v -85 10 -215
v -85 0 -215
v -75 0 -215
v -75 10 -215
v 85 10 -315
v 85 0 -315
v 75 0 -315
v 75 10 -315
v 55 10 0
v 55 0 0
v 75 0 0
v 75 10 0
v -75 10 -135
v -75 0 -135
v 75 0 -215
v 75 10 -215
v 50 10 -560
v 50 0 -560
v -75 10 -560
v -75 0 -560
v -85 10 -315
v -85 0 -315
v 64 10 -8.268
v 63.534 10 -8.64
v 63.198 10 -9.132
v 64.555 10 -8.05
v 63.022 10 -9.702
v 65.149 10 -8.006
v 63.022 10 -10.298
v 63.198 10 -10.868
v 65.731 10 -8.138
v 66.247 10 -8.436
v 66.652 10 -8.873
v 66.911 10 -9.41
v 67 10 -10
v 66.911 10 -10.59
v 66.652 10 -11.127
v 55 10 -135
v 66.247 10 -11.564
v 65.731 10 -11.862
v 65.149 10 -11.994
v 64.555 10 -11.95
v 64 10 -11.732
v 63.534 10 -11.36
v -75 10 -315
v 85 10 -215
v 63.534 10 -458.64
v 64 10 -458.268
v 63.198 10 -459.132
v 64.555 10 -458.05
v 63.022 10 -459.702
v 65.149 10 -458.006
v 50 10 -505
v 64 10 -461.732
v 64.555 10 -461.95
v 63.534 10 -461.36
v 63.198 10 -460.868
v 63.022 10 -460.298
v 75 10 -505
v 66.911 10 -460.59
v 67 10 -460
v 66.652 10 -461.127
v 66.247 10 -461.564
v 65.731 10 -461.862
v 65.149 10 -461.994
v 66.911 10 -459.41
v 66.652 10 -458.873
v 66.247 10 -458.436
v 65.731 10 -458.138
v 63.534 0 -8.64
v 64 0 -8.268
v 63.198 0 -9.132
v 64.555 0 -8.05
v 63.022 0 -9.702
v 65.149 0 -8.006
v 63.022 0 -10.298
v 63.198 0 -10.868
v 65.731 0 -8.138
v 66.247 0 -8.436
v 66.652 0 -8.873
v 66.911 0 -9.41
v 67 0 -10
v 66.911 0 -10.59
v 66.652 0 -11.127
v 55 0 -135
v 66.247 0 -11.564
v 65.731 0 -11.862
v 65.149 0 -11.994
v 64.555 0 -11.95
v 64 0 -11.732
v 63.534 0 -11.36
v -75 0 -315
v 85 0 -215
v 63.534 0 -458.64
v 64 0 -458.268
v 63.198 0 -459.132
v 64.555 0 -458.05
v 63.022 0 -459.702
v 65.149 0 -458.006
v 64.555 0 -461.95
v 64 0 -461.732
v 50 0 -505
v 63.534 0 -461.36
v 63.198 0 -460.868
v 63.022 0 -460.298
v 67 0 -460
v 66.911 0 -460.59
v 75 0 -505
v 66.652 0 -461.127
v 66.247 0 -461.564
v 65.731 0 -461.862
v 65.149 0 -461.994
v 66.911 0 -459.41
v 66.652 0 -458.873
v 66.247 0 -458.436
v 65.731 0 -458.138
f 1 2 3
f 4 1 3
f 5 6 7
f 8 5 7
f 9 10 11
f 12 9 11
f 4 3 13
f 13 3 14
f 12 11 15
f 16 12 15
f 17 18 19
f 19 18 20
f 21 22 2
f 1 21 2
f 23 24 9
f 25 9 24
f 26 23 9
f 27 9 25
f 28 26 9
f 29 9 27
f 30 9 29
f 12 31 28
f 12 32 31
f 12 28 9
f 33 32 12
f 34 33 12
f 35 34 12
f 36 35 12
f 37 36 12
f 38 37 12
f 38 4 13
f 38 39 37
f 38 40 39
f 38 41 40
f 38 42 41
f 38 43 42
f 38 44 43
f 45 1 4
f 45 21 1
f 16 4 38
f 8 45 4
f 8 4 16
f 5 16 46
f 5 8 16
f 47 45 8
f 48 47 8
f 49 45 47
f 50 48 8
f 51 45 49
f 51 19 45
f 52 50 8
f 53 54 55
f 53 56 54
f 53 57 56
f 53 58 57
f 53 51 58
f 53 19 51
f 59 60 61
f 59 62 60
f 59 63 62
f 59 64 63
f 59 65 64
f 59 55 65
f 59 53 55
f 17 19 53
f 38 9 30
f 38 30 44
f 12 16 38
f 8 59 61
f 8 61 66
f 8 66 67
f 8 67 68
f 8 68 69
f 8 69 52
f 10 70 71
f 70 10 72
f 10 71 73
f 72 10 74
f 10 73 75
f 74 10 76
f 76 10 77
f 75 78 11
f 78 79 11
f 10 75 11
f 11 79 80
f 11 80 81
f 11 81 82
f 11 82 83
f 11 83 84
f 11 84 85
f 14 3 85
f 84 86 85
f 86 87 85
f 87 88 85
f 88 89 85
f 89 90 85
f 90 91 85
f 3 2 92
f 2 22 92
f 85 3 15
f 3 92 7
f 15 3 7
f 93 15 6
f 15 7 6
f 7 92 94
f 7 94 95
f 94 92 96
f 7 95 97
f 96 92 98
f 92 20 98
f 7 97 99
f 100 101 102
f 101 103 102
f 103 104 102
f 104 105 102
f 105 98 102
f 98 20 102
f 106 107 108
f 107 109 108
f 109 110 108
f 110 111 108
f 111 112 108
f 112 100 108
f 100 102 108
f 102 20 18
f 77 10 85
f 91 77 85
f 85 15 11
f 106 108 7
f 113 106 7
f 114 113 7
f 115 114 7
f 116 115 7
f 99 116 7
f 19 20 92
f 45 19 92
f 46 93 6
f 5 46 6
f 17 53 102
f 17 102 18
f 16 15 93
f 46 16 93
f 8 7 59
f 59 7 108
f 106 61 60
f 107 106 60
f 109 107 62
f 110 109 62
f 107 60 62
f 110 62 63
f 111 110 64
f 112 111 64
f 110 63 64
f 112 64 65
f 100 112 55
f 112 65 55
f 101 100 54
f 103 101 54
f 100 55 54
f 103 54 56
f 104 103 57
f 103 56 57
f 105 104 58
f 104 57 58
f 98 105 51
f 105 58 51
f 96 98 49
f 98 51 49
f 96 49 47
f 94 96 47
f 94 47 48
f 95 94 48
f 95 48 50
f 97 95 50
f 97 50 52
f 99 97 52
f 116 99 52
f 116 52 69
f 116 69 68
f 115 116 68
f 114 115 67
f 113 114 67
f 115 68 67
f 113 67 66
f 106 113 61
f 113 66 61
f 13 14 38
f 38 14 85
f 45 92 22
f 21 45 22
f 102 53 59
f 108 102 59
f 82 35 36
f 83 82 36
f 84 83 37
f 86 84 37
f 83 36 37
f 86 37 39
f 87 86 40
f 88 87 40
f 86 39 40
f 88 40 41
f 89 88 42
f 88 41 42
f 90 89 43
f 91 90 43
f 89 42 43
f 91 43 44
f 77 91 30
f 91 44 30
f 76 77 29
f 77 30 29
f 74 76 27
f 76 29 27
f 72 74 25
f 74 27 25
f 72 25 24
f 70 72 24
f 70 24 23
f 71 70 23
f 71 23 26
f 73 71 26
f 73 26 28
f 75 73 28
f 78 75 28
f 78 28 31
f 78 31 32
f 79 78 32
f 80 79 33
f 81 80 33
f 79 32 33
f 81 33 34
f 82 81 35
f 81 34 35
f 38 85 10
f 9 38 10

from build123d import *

# Parameters (mm, degrees)
BOSS_EXTRUDE1_DEPTH = 10
SKETCH2_R           = 2
SKETCH2_W           = 25
SKETCH2_H           = 55
CUT_EXTRUDE1_DEPTH  = 10


with BuildPart() as part:
    # Sketch1 → Boss-Extrude1 (new body)
    with BuildSketch(Plane(origin=(0, 0, 0), x_dir=(1, 0, 0), z_dir=(0, 1, 0))):
        Polygon((-75, 215), (-75, 135), (55, 135), (55, 0), (75, 0), (75, 215), (85, 215), (85, 315), (75, 315), (75, 560), (-75, 560), (-75, 315), (-85, 315), (-85, 215), align=None)
    extrude(amount=BOSS_EXTRUDE1_DEPTH)

    # Sketch2 → Cut-Extrude1 (cut)
    with BuildSketch(Plane(origin=(0, 10, 0), x_dir=(1, 0, 0), z_dir=(0, 1, 0))):
        with Locations((65, 10)):
            Circle(SKETCH2_R)
        with Locations((65, 460)):
            Circle(SKETCH2_R)
        with Locations((62.5, 532.5)):
            Rectangle(SKETCH2_W, SKETCH2_H)
    extrude(amount=-CUT_EXTRUDE1_DEPTH, mode=Mode.SUBTRACT)


solid = part.part
